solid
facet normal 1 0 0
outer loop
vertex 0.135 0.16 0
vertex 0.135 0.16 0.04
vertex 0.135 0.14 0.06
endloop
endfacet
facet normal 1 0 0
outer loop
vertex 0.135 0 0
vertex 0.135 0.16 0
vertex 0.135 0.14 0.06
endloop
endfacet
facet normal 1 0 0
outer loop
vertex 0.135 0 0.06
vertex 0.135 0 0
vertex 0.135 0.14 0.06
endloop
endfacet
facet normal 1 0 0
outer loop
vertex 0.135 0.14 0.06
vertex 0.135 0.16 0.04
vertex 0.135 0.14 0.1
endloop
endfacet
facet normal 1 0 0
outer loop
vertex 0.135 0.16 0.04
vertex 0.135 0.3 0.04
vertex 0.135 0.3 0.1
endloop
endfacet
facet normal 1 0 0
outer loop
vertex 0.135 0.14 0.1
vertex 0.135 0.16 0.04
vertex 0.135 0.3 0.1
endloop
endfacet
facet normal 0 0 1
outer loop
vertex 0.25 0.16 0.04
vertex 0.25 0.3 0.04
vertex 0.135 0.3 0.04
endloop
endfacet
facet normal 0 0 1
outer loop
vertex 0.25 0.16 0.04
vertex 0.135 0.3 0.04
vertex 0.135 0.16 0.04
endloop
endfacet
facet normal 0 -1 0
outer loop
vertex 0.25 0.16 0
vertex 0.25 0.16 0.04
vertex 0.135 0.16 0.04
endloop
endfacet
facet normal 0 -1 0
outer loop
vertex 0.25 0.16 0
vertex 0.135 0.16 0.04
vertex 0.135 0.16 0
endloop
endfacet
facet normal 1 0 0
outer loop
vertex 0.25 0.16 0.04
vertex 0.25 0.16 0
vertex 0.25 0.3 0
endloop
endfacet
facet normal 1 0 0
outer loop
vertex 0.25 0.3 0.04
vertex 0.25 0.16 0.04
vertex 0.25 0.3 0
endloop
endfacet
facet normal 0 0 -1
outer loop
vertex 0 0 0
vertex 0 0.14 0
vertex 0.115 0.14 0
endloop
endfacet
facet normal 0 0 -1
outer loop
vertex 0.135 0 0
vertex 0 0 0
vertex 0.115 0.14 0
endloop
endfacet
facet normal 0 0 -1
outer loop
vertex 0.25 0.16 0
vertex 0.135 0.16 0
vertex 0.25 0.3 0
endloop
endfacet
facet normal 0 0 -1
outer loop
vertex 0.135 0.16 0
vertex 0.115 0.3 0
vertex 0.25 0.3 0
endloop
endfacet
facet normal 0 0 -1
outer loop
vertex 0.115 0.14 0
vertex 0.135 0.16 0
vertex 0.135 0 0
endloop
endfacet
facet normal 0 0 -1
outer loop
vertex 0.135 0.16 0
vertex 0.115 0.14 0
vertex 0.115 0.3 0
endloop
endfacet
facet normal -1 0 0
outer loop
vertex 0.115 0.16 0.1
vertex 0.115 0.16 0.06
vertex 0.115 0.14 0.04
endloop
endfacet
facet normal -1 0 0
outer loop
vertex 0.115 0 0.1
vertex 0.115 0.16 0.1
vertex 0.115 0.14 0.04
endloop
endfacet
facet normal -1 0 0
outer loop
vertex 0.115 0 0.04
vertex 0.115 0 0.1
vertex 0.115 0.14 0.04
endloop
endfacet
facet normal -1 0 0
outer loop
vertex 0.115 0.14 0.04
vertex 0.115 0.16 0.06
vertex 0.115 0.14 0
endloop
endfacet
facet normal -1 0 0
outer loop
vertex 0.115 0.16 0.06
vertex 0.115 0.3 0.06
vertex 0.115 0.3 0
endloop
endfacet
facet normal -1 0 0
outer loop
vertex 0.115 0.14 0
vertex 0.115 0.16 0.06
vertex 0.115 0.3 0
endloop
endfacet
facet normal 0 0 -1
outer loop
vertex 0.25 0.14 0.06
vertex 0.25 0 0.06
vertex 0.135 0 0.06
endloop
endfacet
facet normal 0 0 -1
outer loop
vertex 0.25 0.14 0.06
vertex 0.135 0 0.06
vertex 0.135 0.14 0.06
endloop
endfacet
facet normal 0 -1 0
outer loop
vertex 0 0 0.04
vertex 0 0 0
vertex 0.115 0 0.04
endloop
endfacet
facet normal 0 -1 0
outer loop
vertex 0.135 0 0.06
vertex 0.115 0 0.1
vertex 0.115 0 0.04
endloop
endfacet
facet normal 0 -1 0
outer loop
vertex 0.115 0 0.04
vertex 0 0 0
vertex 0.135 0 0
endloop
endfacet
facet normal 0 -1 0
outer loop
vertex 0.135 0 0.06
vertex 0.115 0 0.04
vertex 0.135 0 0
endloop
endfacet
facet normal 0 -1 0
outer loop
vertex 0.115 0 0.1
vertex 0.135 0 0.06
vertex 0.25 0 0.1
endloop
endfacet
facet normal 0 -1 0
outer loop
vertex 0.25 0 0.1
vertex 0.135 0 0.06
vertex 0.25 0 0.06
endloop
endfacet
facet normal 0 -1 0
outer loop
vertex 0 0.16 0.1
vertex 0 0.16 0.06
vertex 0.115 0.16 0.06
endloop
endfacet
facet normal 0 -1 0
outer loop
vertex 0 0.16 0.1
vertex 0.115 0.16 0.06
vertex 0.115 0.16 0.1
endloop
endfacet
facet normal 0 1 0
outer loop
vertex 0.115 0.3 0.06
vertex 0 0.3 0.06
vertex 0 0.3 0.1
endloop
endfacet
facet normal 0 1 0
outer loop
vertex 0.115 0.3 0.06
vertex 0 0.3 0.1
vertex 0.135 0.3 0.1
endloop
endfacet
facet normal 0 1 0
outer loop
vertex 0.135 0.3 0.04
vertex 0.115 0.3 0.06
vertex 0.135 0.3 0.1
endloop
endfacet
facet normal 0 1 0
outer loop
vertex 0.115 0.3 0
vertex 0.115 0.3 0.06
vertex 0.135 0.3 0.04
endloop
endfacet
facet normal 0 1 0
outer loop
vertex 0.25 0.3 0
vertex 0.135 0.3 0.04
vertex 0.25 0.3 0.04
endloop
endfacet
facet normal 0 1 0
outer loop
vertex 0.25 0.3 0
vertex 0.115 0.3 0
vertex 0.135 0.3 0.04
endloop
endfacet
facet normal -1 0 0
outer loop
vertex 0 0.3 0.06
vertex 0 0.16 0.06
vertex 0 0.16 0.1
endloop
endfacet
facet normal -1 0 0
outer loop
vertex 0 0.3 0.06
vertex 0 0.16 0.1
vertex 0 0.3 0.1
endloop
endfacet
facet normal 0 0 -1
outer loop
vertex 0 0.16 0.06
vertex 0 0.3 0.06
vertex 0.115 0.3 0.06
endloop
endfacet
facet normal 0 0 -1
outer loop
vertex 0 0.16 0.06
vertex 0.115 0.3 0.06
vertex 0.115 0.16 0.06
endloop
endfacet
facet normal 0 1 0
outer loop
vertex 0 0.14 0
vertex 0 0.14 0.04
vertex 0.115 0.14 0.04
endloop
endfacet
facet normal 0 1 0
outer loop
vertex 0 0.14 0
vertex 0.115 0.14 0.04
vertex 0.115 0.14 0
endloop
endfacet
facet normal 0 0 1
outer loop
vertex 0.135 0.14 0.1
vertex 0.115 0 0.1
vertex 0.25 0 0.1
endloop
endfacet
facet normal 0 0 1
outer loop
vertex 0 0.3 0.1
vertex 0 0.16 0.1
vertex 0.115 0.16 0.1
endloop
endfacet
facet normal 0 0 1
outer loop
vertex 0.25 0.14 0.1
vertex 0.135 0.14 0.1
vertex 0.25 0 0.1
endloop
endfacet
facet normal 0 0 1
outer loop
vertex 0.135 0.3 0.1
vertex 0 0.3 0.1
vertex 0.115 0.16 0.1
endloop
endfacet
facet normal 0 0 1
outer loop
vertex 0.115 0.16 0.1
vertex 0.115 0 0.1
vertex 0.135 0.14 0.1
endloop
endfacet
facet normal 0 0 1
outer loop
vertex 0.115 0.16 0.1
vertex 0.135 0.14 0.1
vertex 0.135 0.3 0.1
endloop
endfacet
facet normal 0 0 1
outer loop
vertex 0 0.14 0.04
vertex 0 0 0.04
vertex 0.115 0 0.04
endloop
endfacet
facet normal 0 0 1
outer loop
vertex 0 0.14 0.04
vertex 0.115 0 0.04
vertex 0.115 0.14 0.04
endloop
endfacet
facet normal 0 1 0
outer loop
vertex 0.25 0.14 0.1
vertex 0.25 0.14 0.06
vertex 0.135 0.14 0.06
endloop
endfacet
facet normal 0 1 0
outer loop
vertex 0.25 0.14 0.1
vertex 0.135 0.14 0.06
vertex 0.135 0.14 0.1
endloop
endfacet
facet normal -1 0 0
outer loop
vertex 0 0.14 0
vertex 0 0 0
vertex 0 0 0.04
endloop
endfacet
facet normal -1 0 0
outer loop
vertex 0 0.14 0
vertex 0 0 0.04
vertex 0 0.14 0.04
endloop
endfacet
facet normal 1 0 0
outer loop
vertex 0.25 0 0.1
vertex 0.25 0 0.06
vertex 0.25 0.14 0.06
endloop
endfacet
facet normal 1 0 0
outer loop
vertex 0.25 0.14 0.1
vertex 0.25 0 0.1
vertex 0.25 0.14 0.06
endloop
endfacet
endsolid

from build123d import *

# Parameters (mm, degrees)
SKETCH1_W           = 0.25
SKETCH1_H           = 0.3
BOSS_EXTRUDE1_DEPTH = 0.1
CUT_EXTRUDE1_DEPTH  = 0.115
CUT_EXTRUDE2_DEPTH  = 0.115


with BuildPart() as part:
    # Sketch1 → Boss-Extrude1 (new body)
    with BuildSketch(Plane.XY):
        with Locations((0.125, 0.15)):
            Rectangle(SKETCH1_W, SKETCH1_H)
    extrude(amount=BOSS_EXTRUDE1_DEPTH)

    # Sketch2 → Cut-Extrude1 (cut)
    with BuildSketch(Plane.ZY):
        Polygon((0, 0.3), (0.06, 0.3), (0.06, 0.16), (0.1, 0.16), (0.1, 0), (0.04, 0), (0.04, 0.14), (0, 0.14), align=None)
    extrude(amount=-CUT_EXTRUDE1_DEPTH, mode=Mode.SUBTRACT)

    # Sketch4 → Cut-Extrude2 (cut)
    with BuildSketch(Plane(origin=(0.25, 0, 0), x_dir=(0, 0, -1), z_dir=(1, 0, 0))):
        Polygon((-0.1, 0.14), (-0.1, 0.3), (-0.04, 0.3), (-0.04, 0.16), (0, 0.16), (0, 0), (-0.06, 0), (-0.06, 0.14), align=None)
    extrude(amount=-CUT_EXTRUDE2_DEPTH, mode=Mode.SUBTRACT)


solid = part.part
